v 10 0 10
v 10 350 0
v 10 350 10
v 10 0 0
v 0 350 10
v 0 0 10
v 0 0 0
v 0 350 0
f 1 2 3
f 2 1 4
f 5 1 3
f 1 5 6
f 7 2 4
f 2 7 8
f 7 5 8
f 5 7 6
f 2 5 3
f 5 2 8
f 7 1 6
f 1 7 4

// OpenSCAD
difference()
{
  cube([10, 350, 10]);
  translate([0, 0, 50]) cube([10, 350, 10]);
  translate([0, 0, 100]) cube([10, 350, 10]);
  translate([0, 0, 150]) cube([10, 350, 10]);
  translate([0, 0, 200]) cube([10, 350, 10]);
  translate([0, 0, 250]) cube([10, 350, 10]);
  translate([0, 0, 300]) cube([10, 350, 10]);
  translate([0, 0, 350]) cube([10, 350, 10]);
  translate([0, 0, 400]) cube([10, 350, 10]);
  translate([0, 0, 450]) cube([10, 350, 10]);
  translate([0, 0, 500]) cube([10, 350, 10]);
  translate([0, 0, 550]) cube([10, 350, 10]);
  translate([0, 0, 600]) cube([10, 350, 10]);
  translate([0, 0, 650]) cube([10, 350, 10]);
  translate([0, 0, 700]) cube([10, 350, 10]);
}
